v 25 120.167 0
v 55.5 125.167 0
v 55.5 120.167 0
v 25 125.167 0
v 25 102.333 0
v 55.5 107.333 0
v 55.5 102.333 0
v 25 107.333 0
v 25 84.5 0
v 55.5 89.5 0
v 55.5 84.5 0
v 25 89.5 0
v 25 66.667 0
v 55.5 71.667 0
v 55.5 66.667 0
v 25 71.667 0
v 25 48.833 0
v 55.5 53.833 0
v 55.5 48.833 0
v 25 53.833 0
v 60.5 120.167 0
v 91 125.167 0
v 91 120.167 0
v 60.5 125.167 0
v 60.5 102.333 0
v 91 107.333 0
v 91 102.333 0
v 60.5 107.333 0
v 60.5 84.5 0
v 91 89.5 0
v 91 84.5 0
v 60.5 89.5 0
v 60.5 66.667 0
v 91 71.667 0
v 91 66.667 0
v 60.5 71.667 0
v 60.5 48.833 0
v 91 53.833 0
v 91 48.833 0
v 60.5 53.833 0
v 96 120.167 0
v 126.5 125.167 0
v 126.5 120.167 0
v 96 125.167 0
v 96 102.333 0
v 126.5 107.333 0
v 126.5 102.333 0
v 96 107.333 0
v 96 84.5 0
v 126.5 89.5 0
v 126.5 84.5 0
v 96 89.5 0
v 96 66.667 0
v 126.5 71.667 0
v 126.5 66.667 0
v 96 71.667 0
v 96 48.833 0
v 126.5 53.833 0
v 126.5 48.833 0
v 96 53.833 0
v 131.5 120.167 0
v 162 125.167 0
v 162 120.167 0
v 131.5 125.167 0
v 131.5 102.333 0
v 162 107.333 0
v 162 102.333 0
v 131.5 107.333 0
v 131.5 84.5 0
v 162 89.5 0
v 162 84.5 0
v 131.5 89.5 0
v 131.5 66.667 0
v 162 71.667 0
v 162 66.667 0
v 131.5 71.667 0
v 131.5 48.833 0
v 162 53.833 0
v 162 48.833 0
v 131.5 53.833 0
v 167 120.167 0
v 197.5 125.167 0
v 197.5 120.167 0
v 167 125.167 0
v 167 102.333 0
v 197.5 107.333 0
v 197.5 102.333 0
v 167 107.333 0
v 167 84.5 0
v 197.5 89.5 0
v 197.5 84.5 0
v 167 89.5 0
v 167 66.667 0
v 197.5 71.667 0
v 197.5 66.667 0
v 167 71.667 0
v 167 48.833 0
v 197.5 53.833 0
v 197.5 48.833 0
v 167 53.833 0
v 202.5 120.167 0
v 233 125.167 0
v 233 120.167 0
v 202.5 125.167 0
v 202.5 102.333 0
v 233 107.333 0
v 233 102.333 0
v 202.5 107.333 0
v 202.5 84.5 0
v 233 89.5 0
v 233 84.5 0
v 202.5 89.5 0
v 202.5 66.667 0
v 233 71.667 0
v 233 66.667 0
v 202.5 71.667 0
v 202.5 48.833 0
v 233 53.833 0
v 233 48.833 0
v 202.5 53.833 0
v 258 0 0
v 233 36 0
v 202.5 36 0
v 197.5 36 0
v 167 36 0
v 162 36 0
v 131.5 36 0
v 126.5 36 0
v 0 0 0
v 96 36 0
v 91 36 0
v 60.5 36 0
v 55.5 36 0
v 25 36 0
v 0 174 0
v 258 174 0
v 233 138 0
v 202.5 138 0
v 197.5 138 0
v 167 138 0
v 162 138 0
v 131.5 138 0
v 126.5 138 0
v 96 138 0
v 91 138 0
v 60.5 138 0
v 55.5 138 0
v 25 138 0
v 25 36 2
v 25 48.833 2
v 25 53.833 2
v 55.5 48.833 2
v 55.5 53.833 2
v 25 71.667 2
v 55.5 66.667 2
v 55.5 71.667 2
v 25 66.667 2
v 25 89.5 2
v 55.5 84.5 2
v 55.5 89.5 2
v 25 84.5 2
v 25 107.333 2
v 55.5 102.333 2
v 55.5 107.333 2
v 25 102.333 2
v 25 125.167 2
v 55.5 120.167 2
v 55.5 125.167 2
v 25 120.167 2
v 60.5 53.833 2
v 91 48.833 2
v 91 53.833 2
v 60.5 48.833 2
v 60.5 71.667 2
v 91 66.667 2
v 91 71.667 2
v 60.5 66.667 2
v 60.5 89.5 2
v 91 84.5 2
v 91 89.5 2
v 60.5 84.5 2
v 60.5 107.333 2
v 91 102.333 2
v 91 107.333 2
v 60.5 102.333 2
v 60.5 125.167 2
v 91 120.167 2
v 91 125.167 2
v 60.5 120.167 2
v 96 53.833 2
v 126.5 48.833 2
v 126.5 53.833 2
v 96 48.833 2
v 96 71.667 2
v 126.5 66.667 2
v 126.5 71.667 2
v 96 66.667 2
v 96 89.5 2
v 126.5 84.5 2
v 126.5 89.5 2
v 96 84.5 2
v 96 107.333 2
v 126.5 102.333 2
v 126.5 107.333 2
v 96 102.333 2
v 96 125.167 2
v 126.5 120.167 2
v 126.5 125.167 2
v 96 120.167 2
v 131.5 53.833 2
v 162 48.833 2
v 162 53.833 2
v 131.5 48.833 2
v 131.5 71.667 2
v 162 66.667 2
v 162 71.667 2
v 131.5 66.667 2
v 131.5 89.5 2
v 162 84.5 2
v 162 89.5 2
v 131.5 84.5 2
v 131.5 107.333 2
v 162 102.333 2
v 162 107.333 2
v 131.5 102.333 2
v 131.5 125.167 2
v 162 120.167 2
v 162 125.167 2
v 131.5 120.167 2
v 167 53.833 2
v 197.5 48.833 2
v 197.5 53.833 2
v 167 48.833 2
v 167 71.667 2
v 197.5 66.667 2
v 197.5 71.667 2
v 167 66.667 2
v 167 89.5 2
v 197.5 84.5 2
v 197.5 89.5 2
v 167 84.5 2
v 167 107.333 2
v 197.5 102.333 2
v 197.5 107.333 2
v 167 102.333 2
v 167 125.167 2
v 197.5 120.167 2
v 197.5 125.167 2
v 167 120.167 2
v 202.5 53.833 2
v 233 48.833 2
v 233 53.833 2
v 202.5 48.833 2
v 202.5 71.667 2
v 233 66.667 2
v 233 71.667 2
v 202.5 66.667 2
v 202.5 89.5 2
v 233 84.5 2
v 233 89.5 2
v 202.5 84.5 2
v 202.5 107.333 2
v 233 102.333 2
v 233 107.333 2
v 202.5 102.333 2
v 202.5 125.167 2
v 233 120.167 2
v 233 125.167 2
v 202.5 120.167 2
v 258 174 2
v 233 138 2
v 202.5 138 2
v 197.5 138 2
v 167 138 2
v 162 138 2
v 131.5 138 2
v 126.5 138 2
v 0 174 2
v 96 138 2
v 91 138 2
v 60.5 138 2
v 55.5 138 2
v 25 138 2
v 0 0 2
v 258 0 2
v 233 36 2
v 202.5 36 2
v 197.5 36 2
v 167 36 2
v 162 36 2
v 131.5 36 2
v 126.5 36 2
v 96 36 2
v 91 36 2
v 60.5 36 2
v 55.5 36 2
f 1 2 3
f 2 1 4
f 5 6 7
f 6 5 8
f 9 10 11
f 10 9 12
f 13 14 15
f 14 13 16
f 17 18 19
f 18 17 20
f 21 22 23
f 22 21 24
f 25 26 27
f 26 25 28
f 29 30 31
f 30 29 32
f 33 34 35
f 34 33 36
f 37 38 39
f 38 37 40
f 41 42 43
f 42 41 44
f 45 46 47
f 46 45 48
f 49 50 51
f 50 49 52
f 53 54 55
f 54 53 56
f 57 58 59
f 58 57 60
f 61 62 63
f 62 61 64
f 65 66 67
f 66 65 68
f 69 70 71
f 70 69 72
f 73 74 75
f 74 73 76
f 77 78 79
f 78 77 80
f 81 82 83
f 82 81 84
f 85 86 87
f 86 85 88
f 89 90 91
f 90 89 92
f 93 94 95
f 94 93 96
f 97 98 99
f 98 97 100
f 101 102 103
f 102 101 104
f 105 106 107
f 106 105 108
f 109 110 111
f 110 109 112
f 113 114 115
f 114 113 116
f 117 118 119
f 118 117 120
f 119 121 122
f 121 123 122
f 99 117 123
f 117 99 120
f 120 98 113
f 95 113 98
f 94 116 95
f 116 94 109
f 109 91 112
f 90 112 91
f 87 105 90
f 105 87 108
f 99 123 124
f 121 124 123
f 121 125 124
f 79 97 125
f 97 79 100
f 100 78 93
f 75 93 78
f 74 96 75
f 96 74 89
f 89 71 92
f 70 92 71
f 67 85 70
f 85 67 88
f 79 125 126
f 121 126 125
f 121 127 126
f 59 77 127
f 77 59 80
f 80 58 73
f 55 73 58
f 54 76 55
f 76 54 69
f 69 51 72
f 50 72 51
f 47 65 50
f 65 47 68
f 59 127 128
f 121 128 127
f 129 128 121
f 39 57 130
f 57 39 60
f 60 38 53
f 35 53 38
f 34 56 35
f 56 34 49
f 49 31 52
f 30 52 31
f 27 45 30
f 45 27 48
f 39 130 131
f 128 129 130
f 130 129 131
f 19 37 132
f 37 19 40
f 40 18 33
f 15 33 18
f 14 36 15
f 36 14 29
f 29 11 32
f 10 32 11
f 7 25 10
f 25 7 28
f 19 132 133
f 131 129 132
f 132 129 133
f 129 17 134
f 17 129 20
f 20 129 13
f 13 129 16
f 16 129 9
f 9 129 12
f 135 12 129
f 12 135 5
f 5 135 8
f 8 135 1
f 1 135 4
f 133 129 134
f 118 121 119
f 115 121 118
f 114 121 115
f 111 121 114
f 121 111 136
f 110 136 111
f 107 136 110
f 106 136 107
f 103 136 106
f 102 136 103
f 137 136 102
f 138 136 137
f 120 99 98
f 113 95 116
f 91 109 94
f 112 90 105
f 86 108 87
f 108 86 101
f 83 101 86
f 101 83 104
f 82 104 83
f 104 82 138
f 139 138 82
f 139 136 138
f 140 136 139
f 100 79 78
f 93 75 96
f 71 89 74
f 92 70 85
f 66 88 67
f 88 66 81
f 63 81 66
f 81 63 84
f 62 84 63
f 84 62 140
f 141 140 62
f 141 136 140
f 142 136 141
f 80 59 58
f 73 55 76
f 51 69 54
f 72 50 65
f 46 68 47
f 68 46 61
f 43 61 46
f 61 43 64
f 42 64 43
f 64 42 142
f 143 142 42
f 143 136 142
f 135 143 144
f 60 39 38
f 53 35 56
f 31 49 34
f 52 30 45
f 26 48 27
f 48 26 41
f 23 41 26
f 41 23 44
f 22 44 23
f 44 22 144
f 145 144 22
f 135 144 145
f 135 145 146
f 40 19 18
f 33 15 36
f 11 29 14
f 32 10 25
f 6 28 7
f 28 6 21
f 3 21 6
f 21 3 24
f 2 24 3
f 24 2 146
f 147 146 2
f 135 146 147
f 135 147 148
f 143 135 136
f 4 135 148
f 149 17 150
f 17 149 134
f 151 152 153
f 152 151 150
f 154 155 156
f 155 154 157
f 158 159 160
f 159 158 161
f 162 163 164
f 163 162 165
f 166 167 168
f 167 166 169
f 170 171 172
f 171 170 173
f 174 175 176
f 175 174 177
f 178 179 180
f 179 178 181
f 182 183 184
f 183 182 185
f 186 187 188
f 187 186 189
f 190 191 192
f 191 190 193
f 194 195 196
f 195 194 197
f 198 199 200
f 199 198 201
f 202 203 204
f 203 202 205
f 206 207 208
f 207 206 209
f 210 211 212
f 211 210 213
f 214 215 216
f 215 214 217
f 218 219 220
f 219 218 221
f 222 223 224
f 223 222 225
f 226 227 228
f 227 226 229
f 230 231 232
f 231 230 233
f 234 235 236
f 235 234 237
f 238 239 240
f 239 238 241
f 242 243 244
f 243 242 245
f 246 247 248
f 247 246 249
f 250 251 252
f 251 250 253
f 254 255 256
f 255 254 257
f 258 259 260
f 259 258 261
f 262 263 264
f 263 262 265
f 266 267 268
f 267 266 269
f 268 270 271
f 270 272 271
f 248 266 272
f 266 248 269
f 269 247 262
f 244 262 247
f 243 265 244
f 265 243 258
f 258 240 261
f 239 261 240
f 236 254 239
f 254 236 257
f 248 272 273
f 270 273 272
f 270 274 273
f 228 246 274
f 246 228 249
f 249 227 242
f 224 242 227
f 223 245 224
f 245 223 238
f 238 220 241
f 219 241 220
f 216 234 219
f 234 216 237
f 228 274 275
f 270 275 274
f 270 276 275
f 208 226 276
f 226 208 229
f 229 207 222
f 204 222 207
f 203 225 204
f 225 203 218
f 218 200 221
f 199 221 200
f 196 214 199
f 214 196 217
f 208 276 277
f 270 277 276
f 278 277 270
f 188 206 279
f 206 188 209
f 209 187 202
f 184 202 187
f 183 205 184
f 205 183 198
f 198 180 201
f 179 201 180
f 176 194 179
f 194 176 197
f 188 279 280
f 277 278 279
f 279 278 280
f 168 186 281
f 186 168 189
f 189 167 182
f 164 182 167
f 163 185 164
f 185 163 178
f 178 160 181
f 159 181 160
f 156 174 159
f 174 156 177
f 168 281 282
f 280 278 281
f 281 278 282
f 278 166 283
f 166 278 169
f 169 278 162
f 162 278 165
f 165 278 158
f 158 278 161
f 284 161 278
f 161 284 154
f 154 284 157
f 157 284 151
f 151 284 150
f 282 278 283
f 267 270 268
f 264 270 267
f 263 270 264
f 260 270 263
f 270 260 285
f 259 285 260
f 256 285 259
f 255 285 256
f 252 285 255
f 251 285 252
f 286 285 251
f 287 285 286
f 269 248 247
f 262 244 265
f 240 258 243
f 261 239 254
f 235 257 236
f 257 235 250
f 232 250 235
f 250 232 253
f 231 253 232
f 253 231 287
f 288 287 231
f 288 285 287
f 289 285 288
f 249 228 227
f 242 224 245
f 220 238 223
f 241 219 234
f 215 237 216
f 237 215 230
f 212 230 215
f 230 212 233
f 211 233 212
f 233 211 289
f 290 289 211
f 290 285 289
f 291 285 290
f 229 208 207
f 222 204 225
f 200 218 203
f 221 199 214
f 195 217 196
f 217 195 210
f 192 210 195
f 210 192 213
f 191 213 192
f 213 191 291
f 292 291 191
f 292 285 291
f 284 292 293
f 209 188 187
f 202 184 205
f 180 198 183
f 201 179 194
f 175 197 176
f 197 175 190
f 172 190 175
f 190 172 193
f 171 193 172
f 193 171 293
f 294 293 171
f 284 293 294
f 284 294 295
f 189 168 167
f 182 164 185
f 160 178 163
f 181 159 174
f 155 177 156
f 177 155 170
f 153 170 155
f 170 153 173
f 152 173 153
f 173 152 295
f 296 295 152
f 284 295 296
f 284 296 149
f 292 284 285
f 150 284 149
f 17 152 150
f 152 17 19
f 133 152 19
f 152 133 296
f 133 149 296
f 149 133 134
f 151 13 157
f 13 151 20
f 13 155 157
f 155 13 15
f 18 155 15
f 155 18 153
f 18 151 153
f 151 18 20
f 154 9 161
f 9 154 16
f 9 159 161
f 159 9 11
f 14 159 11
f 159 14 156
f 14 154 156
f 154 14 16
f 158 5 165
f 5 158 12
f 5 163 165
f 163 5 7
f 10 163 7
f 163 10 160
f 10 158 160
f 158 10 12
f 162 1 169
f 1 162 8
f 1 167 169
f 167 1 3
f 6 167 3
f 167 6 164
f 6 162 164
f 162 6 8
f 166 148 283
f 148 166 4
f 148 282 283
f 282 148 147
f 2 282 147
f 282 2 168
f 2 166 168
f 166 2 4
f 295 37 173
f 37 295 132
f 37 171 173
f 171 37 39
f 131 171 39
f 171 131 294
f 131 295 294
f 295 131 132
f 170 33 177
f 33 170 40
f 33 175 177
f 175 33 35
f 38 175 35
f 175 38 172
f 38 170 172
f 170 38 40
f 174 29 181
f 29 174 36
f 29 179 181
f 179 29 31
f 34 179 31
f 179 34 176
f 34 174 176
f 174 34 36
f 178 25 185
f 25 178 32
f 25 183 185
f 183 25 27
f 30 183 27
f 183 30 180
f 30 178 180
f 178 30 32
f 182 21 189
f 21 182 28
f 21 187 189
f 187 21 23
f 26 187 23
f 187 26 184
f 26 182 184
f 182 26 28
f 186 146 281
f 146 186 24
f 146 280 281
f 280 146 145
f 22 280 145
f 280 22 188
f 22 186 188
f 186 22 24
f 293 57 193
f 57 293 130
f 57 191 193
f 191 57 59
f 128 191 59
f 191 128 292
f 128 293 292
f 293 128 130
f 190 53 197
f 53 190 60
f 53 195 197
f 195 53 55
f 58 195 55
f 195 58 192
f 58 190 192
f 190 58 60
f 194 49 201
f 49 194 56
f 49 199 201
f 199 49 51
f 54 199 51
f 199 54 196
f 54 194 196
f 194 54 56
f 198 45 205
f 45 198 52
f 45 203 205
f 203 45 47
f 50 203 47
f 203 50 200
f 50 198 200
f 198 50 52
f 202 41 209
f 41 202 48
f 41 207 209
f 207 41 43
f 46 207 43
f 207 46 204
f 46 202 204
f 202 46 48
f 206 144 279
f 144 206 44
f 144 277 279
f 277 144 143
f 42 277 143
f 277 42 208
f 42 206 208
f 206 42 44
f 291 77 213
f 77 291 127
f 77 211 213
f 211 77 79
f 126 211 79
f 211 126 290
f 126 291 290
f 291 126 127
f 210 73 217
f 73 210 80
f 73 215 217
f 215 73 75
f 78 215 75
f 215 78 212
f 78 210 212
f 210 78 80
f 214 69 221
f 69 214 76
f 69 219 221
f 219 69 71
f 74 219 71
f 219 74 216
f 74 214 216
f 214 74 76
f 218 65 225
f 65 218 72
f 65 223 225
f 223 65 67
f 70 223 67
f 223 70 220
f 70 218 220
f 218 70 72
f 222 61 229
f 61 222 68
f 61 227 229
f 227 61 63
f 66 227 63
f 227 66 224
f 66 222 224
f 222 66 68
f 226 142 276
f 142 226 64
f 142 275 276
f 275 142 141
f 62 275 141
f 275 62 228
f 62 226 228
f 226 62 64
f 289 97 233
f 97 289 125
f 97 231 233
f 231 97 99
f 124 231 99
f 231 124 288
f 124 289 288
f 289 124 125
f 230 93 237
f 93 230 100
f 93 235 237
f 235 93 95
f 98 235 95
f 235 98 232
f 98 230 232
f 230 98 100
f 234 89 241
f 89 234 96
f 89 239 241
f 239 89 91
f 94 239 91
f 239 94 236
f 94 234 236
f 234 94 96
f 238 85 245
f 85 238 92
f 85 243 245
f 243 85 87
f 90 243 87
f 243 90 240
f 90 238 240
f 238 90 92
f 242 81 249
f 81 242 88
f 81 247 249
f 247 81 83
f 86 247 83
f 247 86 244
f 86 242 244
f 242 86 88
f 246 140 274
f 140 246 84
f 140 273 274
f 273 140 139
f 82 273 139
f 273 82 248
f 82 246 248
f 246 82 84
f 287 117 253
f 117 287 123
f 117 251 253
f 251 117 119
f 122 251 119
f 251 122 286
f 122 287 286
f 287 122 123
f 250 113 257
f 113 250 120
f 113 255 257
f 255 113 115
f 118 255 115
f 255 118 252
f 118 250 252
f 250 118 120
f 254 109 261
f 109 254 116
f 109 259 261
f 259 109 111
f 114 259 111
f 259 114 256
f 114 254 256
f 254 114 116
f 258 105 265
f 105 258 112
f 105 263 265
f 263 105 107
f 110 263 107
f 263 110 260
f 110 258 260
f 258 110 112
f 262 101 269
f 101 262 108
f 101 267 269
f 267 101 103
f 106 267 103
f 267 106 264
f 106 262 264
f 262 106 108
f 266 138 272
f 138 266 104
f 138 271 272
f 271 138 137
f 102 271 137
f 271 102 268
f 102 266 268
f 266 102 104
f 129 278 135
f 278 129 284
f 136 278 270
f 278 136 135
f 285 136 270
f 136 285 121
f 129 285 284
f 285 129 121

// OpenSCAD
//Overall width (left-right) distance (in mm)
total_width = 258; //[40:400]
// Overall height (top-bottom) distance (in mm)
total_height = 174; // [50:300]
// Thickness of the sheet 
thickness = 2; // [0.5:5]
// Number of columns
number_columns = 6; // [1:15]
// Number of rows
number_rows = 6; // [1:15]
// Left margin (distance from left side of sheet to the first button, in mm)
left_margin = 25; // [0:50]
// Right margin (distance from right side of sheet to the first button, in mm)
right_margin = 25; // [0:50]
// Top margin (distance from top of sheet to the first button, in mm)
top_margin = 36; // [0:50]
// Bottom margin (distance from bottom of sheet to the last button, in mm)
bottom_margin = 36; // [0:50]
// Distance between the right edge of one button and the left edge of the next (in mm)
horizontal_gap = 5; // [2:30]
// Distance between the bottom edge of one button and the top edge of the next (in mm)
vertical_gap = 5; // [2:30]

module makebuttons(number_columns,number_rows,left_margin,top_margin,button_width,button_height,horizontal_gap,vertical_gap) {

for ( i = [0 : number_columns-1] )
{
	for (j = [0 : number_rows-1])
    translate([left_margin + i * (button_width + horizontal_gap), top_margin + j * (button_height + vertical_gap), 0])
	linear_extrude(height=thickness)
   square([button_width,button_height]);
}

}

button_height = (total_height - top_margin - bottom_margin - (number_rows-1)*vertical_gap ) / number_rows;

button_width = (total_width - left_margin - right_margin - (number_columns-1)*horizontal_gap ) / number_columns;

difference() {
linear_extrude(height = thickness)
square([total_width,total_height]);

makebuttons(number_columns,number_rows,left_margin,top_margin,button_width,button_height,horizontal_gap,vertical_gap);
}
